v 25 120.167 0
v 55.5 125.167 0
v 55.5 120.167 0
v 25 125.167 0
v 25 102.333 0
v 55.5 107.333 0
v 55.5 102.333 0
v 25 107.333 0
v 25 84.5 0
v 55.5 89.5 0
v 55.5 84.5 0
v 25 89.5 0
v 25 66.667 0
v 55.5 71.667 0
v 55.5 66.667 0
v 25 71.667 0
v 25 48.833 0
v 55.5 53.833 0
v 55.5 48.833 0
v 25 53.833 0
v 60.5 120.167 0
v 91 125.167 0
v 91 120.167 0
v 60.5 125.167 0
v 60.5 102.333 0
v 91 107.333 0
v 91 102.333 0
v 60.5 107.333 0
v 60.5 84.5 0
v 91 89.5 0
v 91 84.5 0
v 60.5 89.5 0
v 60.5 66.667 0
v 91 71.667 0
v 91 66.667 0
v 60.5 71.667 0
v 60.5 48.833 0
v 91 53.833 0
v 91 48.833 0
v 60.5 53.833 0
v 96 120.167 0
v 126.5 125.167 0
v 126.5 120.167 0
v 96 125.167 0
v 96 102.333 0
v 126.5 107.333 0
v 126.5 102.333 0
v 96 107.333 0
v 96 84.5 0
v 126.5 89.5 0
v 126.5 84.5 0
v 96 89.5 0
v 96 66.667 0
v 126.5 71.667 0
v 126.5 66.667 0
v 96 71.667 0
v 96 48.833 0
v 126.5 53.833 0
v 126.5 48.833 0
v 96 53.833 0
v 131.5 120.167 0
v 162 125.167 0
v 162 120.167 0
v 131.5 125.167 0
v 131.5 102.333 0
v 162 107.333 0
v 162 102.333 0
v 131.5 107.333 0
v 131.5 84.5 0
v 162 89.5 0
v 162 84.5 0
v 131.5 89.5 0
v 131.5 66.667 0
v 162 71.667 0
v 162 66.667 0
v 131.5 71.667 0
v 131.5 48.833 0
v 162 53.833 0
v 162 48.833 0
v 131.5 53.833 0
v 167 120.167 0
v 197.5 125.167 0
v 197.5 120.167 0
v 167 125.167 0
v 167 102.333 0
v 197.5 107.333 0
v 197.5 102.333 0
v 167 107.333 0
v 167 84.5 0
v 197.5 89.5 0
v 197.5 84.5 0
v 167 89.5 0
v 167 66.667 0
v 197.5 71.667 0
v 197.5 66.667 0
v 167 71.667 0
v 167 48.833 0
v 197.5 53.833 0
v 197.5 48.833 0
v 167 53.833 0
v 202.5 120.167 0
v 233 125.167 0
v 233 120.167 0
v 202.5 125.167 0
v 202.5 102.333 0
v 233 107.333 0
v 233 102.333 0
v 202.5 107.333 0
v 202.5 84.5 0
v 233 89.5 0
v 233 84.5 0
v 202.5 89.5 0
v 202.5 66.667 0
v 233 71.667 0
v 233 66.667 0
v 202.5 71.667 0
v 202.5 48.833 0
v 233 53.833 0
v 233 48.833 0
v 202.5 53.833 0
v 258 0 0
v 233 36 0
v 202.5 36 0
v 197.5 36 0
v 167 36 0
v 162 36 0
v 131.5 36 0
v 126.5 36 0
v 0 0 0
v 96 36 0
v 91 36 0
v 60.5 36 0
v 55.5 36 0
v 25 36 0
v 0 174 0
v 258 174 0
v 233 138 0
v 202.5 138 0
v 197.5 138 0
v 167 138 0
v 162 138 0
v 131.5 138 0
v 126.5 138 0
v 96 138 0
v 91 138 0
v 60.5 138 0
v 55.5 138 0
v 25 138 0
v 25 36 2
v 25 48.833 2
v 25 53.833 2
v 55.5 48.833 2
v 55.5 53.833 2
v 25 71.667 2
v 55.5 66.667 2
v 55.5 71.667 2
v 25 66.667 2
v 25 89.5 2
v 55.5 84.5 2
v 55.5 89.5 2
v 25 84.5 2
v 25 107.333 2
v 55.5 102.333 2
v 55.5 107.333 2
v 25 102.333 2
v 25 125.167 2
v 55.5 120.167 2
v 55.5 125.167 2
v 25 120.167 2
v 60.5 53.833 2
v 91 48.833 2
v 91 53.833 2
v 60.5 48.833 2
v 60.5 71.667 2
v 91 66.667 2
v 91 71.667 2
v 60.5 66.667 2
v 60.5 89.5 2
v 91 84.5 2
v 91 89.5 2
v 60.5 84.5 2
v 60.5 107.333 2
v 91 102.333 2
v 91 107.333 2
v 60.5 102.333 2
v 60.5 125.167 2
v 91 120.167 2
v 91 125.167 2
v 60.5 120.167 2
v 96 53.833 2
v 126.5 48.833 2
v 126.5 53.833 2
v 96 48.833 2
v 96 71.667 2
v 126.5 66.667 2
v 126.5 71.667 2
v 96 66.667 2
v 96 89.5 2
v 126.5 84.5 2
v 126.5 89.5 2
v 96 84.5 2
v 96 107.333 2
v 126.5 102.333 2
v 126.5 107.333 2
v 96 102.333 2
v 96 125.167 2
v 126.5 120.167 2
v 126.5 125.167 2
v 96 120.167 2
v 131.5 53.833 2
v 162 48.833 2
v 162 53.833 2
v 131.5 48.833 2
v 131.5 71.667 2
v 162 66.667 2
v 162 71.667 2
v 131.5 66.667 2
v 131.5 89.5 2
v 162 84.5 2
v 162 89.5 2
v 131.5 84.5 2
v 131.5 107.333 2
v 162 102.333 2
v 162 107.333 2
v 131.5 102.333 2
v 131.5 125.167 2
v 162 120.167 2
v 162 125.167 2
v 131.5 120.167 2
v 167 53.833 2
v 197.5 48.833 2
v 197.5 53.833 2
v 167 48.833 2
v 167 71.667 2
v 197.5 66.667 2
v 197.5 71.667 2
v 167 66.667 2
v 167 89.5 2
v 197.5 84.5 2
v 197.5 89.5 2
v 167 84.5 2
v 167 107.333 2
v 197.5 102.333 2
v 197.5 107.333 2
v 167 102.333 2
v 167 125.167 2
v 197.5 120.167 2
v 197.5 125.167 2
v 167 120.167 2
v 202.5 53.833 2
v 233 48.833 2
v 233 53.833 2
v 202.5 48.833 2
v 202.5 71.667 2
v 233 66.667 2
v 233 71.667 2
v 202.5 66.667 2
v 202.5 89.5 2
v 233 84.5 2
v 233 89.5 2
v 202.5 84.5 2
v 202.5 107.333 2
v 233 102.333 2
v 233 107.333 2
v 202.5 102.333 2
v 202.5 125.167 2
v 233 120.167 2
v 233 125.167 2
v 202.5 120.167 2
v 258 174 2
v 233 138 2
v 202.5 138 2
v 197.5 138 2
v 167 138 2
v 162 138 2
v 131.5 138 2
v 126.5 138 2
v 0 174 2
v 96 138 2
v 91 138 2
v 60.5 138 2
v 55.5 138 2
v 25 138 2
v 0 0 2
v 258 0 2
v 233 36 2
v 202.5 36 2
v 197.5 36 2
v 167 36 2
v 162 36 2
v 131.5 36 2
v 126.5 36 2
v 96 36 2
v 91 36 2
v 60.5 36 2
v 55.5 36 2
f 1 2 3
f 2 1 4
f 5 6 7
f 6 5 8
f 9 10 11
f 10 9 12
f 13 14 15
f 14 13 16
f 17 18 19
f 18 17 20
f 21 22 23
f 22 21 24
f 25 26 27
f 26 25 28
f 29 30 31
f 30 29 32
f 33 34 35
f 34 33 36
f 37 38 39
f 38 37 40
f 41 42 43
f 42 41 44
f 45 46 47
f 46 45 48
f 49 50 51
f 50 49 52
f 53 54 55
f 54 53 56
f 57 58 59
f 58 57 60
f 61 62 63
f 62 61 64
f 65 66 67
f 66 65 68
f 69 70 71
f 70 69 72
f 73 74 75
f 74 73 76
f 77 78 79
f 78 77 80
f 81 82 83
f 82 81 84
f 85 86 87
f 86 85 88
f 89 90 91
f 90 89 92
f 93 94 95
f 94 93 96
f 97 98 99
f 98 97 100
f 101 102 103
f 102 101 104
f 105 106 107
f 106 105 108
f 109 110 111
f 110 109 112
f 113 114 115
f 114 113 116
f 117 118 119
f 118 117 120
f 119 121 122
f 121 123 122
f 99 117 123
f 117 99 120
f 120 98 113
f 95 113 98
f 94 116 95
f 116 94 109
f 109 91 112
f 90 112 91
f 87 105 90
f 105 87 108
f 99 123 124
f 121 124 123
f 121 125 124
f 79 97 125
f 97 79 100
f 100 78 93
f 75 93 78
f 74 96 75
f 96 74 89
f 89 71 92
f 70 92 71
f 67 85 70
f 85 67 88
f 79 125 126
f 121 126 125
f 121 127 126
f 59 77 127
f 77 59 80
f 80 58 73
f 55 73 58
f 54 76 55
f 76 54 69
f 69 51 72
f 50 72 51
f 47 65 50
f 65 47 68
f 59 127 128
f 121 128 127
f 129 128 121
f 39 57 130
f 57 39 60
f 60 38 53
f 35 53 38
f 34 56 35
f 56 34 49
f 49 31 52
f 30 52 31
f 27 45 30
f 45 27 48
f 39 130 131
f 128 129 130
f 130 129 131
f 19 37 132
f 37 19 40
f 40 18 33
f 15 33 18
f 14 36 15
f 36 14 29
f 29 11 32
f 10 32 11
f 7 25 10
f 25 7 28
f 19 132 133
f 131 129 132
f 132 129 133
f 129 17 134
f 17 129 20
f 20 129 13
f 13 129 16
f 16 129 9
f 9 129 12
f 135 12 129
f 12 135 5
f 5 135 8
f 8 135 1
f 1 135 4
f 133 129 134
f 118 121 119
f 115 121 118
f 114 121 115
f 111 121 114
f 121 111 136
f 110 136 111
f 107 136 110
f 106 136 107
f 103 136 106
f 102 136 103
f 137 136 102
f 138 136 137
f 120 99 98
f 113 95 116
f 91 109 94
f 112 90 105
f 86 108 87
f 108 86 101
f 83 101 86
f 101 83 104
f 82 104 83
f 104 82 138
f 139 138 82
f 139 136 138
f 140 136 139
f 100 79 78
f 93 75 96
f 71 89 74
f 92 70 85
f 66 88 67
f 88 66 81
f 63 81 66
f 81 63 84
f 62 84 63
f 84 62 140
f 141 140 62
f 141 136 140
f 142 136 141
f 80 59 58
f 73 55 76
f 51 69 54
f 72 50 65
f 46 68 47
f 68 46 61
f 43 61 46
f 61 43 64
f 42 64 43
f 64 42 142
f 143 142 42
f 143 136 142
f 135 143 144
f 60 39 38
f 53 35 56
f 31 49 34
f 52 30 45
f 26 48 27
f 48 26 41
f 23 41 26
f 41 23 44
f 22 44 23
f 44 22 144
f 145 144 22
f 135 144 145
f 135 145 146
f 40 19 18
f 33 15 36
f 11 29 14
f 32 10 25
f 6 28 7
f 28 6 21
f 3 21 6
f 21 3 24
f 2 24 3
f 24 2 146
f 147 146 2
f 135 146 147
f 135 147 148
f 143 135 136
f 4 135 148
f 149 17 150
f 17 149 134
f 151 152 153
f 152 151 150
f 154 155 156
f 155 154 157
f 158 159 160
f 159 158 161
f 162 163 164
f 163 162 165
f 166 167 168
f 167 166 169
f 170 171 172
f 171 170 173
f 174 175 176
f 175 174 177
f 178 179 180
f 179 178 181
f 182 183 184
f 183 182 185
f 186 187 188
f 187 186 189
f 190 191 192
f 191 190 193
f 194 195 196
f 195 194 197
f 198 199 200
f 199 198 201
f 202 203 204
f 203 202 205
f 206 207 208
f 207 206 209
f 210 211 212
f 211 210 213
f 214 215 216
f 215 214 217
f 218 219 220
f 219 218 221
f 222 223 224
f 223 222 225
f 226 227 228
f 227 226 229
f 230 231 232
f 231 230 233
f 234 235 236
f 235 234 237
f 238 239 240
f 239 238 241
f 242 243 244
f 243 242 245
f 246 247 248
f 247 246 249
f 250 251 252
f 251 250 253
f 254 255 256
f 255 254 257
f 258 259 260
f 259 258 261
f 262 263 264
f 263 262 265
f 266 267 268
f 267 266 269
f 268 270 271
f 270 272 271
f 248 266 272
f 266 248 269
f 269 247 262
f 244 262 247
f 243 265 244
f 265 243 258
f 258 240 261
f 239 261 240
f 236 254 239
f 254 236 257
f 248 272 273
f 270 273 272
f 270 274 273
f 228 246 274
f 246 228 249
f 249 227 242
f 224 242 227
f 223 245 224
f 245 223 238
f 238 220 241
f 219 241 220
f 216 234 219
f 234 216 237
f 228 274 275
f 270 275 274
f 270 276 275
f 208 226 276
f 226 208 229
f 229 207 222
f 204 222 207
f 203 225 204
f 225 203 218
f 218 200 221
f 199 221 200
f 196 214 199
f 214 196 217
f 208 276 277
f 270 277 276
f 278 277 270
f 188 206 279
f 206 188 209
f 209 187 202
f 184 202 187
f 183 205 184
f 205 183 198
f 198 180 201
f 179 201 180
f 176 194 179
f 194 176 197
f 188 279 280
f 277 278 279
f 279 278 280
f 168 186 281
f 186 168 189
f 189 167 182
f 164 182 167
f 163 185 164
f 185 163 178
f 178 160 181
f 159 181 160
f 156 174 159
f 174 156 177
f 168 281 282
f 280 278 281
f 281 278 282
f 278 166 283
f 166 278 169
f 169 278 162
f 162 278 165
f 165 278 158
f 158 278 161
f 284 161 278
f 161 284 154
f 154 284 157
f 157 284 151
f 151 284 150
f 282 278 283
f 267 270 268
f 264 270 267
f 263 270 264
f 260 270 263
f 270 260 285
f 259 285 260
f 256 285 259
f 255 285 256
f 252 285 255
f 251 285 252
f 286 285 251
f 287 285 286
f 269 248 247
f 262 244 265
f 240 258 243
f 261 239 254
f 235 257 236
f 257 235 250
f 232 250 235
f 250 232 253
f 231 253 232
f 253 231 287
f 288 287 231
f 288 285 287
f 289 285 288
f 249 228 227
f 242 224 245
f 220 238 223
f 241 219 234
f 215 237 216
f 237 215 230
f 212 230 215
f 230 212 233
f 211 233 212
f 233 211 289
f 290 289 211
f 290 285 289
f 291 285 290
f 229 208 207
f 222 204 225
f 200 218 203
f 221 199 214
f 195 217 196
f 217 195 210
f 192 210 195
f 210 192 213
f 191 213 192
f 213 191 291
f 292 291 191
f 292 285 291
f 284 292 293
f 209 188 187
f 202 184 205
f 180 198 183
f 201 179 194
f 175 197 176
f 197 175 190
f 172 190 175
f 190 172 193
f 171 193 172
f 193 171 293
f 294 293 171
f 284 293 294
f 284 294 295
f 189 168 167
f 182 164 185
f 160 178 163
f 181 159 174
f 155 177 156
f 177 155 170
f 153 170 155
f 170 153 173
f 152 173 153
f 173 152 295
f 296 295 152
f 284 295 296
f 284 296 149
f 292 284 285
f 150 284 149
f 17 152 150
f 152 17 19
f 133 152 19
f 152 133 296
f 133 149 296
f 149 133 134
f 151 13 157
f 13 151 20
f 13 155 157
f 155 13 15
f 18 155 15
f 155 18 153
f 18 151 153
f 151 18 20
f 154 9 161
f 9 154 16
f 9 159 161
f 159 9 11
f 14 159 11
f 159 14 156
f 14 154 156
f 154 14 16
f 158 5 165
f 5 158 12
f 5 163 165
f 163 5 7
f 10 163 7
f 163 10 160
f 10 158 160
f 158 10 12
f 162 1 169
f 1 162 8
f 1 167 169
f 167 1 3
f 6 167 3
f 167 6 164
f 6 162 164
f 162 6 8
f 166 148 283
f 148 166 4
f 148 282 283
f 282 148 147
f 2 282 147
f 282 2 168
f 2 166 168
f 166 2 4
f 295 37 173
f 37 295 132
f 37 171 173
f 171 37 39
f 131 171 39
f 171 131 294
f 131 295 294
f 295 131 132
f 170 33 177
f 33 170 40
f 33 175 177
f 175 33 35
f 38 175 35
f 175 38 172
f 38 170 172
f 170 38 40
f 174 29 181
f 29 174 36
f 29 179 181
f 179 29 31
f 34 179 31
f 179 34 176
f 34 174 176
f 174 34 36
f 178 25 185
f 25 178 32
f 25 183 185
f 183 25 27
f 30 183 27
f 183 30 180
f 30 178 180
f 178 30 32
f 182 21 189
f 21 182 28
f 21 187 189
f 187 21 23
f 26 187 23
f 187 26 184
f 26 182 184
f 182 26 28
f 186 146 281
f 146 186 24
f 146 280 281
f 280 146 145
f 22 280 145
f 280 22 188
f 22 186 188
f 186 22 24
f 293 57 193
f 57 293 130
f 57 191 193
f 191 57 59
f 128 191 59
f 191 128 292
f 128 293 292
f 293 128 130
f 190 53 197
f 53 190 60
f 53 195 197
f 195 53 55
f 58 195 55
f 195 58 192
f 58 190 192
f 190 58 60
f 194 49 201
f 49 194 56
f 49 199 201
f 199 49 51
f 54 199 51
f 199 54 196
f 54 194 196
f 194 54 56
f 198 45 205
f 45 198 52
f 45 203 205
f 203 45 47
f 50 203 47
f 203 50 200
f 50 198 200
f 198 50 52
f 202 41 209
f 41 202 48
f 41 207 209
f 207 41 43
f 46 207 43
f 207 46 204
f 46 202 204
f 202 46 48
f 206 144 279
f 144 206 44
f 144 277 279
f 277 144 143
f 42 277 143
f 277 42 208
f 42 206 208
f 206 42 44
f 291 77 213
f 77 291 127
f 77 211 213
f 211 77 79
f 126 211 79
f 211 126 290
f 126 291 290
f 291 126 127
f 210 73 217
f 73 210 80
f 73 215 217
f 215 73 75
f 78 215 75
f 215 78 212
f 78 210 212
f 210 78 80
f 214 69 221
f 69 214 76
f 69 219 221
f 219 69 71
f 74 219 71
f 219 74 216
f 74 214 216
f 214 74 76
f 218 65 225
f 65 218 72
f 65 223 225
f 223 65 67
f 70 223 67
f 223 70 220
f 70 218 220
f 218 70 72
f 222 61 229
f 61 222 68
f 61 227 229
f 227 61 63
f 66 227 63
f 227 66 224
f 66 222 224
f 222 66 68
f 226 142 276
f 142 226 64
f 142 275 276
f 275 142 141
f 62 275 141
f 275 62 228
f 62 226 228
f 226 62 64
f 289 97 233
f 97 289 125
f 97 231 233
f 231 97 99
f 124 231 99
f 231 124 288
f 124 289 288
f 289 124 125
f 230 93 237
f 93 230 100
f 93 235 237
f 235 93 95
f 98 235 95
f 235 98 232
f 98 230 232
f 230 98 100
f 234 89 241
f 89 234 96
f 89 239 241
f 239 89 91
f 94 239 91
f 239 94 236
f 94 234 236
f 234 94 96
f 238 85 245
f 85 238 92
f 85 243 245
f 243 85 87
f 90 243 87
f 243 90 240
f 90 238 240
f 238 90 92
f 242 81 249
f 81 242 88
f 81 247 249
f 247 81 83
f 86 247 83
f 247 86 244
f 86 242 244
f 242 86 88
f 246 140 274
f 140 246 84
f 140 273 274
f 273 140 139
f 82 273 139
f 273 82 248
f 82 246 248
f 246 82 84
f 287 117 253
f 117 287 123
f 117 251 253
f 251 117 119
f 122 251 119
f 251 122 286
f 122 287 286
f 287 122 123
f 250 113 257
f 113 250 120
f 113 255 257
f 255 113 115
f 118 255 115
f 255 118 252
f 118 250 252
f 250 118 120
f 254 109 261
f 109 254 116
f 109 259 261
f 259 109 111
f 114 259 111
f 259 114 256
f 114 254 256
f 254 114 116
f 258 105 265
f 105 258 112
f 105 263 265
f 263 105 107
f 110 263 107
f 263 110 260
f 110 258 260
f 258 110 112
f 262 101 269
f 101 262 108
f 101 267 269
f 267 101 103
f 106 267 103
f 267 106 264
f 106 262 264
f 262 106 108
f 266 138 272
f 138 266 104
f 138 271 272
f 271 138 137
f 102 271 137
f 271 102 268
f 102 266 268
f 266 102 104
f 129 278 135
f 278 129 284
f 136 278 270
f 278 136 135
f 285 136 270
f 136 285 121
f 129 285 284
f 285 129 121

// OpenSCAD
//Overall width (left-right) distance (in mm)
total_width = 258; //[40:400]
// Overall height (top-bottom) distance (in mm)
total_height = 174; // [50:300]
// Thickness of the sheet 
thickness = 2; // [0.5:5]
// Number of columns
number_columns = 6; // [1:15]
// Number of rows
number_rows = 6; // [1:15]
// Left margin (distance from left side of sheet to the first button, in mm)
left_margin = 25; // [0:50]
// Right margin (distance from right side of sheet to the first button, in mm)
right_margin = 25; // [0:50]
// Top margin (distance from top of sheet to the first button, in mm)
top_margin = 36; // [0:50]
// Bottom margin (distance from bottom of sheet to the last button, in mm)
bottom_margin = 36; // [0:50]
// Distance between the right edge of one button and the left edge of the next (in mm)
horizontal_gap = 5; // [2:30]
// Distance between the bottom edge of one button and the top edge of the next (in mm)
vertical_gap = 5; // [2:30]

module makebuttons(number_columns,number_rows,left_margin,top_margin,button_width,button_height,horizontal_gap,vertical_gap) {

for ( i = [0 : number_columns-1] )
{
	for (j = [0 : number_rows-1])
    translate([left_margin + i * (button_width + horizontal_gap), top_margin + j * (button_height + vertical_gap), 0])
	linear_extrude(height=thickness)
   square([button_width,button_height]);
}

}

button_height = (total_height - top_margin - bottom_margin - (number_rows-1)*vertical_gap ) / number_rows;

button_width = (total_width - left_margin - right_margin - (number_columns-1)*horizontal_gap ) / number_columns;

difference() {
linear_extrude(height = thickness)
square([total_width,total_height]);

makebuttons(number_columns,number_rows,left_margin,top_margin,button_width,button_height,horizontal_gap,vertical_gap);
}
